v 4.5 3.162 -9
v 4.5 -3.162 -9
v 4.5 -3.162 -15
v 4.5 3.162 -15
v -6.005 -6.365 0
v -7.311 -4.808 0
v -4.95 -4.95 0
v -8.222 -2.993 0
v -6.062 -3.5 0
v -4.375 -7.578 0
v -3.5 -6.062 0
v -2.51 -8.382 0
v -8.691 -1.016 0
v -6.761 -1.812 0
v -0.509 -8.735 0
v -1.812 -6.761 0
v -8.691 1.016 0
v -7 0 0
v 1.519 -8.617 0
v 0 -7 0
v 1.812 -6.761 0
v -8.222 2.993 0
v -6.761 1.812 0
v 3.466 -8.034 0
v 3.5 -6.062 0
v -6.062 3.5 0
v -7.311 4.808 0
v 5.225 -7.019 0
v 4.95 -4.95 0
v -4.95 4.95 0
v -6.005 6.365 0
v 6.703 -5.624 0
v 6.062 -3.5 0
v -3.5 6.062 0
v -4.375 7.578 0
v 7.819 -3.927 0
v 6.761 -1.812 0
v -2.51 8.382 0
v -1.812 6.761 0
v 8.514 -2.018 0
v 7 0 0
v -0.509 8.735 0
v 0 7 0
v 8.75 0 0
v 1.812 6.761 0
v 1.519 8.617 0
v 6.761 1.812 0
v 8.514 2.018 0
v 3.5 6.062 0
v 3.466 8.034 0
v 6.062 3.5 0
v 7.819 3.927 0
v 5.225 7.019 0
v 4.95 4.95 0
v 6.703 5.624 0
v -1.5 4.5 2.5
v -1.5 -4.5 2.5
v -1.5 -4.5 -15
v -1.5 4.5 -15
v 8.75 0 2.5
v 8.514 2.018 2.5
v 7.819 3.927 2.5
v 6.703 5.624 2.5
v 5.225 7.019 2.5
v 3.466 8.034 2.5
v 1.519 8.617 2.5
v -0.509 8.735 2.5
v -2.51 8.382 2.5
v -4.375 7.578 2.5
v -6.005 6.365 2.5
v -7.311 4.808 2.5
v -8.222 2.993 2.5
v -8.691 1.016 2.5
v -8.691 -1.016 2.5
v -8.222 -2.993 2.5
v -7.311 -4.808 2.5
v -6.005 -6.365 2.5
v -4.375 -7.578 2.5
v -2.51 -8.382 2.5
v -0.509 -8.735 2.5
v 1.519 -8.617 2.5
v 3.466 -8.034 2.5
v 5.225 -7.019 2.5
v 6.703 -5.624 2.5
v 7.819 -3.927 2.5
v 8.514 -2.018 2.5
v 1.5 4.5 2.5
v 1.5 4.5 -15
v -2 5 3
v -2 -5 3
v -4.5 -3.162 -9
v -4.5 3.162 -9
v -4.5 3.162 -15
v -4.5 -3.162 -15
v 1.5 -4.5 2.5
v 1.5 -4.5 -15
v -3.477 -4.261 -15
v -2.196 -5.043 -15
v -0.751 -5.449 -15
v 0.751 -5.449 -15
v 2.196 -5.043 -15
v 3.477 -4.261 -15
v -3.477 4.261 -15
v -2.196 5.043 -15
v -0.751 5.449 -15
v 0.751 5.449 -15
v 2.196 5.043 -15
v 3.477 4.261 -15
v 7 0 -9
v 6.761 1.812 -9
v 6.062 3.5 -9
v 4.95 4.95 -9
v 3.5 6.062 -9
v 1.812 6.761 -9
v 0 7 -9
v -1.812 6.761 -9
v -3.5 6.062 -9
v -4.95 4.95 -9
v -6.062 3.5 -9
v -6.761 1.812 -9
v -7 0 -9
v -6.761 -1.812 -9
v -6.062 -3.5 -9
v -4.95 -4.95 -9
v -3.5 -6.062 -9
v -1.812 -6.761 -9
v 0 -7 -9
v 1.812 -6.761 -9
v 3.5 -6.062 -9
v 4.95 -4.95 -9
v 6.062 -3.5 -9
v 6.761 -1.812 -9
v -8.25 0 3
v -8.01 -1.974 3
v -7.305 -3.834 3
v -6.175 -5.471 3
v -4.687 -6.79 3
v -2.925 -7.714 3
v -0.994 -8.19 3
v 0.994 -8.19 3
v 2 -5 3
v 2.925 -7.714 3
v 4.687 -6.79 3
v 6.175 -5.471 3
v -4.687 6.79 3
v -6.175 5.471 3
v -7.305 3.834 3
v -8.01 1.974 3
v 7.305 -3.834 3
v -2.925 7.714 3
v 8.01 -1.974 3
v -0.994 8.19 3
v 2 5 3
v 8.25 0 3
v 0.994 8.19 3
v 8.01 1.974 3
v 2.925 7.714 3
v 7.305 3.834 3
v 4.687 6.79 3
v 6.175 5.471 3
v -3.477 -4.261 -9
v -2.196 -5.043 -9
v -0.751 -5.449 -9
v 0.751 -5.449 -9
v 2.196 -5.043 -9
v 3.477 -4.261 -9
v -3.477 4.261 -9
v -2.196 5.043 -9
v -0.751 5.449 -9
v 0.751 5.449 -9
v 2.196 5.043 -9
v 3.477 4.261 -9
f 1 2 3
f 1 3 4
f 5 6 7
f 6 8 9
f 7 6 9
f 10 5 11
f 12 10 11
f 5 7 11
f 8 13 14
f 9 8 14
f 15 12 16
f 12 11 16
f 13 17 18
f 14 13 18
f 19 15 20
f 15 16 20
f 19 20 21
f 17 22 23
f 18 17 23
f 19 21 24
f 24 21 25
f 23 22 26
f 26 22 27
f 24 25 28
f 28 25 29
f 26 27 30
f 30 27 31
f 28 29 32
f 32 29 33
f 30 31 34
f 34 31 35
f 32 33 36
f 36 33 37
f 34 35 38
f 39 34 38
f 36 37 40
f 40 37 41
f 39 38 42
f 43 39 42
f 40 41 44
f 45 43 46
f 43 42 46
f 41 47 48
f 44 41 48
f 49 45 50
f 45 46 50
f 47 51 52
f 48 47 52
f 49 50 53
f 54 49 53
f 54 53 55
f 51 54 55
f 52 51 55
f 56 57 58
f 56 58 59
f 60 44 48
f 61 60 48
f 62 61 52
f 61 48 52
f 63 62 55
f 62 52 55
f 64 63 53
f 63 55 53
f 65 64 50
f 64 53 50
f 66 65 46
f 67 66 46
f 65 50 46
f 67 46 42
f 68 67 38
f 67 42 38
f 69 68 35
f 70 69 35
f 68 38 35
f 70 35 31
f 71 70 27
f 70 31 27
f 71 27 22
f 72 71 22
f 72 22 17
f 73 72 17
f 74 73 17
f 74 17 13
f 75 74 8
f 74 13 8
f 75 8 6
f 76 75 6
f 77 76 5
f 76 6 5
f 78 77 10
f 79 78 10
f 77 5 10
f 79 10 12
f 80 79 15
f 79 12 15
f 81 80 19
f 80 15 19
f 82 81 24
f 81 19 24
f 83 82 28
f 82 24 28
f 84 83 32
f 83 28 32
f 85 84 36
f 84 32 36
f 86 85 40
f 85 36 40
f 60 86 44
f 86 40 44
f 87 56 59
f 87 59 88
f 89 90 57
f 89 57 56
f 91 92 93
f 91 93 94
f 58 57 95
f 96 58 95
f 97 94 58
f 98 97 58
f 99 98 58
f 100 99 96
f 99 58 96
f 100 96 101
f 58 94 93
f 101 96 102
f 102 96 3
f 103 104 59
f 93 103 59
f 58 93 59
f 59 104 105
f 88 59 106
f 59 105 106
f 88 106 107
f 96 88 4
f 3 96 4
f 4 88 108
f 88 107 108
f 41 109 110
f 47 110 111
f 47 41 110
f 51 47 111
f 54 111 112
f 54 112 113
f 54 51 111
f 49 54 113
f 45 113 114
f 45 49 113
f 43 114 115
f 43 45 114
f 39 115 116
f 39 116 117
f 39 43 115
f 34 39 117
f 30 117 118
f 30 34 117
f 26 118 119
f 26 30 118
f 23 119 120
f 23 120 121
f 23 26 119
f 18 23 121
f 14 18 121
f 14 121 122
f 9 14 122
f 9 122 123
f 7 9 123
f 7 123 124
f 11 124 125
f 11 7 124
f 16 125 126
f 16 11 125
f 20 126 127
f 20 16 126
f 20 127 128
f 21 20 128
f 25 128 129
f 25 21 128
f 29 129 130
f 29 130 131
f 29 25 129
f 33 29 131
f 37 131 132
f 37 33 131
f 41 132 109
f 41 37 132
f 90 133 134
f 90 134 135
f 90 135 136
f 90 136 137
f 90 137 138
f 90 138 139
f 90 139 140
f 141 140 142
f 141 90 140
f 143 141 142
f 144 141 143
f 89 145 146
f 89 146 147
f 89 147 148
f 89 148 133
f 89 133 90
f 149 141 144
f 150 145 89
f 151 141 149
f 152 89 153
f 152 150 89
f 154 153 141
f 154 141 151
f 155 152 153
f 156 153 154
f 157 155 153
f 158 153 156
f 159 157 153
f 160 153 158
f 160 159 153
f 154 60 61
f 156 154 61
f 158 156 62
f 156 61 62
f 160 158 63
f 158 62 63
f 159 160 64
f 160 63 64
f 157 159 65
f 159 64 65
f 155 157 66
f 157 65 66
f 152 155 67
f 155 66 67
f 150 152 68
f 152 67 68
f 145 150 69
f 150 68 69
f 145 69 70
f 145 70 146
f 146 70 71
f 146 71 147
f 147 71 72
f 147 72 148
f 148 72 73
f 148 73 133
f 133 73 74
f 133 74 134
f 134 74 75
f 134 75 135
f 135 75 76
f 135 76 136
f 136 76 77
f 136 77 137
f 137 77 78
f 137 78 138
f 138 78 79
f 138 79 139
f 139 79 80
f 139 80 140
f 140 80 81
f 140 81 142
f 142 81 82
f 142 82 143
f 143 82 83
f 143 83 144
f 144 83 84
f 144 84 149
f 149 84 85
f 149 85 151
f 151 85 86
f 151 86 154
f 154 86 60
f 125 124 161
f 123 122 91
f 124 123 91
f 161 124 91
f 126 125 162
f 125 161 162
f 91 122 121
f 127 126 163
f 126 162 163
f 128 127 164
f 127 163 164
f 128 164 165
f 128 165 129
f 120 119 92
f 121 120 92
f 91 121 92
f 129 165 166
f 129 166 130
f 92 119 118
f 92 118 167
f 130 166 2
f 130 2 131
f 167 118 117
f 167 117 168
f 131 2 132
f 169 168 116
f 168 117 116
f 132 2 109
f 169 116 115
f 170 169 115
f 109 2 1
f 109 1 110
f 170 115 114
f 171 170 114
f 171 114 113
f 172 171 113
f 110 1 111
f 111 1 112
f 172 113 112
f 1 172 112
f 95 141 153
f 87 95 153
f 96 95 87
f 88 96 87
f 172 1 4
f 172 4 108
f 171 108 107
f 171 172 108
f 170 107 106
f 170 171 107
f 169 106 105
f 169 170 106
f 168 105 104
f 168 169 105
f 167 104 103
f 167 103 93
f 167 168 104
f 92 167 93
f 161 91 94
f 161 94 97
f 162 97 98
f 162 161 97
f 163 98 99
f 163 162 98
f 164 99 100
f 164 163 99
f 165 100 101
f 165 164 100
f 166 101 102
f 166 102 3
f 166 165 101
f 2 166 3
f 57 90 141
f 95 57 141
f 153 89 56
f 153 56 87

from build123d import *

# Parameters (mm, degrees)
F0_R     = 8.75
F3_DEPTH = 3
F1_R     = 7
F4_DEPTH = 9
F5_DEPTH = 15
F6_W     = 3
F6_H     = 9
F7_DEPTH = 20
F8_SIZE  = 0.5


with BuildPart() as f3:
    # F0 (on Top) → F3 (new body)
    with BuildSketch(Plane.XY):
        Circle(F0_R)
    extrude(amount=F3_DEPTH)

    # F1 (on Top) → F4 (join)
    with BuildSketch(Plane.XY):
        Circle(F1_R)
    extrude(amount=-F4_DEPTH)

    # F2 (on Top) → F5 (join)
    with BuildSketch(Plane.XY):
        with BuildLine():
            Line((4.5, -3.1622776602), (4.5, 3.1622776602))
            ThreePointArc((4.5, 3.1622776602), (0, 5.5), (-4.5, 3.1622776602))
            Line((-4.5, 3.1622776602), (-4.5, -3.1622776602))
            ThreePointArc((-4.5, -3.1622776602), (0, -5.5), (4.5, -3.1622776602))
        make_face()
    extrude(amount=-F5_DEPTH)

    # F6 (on Top) → F7 (cut, symmetric)
    with BuildSketch(Plane.XY):
        Rectangle(F6_W, F6_H)
    extrude(amount=F7_DEPTH, both=True, mode=Mode.SUBTRACT)

    # F8
    f8_edges = [f3.edges().sort_by_distance(p)[0] for p in [
        (-8.75, 0, 3),
        (-1.5, 0, 3),
        (0, -4.5, 3),
        (1.5, 0, 3),
        (0, 4.5, 3),
    ]]
    chamfer(f8_edges, length=F8_SIZE)


solid = f3.part
